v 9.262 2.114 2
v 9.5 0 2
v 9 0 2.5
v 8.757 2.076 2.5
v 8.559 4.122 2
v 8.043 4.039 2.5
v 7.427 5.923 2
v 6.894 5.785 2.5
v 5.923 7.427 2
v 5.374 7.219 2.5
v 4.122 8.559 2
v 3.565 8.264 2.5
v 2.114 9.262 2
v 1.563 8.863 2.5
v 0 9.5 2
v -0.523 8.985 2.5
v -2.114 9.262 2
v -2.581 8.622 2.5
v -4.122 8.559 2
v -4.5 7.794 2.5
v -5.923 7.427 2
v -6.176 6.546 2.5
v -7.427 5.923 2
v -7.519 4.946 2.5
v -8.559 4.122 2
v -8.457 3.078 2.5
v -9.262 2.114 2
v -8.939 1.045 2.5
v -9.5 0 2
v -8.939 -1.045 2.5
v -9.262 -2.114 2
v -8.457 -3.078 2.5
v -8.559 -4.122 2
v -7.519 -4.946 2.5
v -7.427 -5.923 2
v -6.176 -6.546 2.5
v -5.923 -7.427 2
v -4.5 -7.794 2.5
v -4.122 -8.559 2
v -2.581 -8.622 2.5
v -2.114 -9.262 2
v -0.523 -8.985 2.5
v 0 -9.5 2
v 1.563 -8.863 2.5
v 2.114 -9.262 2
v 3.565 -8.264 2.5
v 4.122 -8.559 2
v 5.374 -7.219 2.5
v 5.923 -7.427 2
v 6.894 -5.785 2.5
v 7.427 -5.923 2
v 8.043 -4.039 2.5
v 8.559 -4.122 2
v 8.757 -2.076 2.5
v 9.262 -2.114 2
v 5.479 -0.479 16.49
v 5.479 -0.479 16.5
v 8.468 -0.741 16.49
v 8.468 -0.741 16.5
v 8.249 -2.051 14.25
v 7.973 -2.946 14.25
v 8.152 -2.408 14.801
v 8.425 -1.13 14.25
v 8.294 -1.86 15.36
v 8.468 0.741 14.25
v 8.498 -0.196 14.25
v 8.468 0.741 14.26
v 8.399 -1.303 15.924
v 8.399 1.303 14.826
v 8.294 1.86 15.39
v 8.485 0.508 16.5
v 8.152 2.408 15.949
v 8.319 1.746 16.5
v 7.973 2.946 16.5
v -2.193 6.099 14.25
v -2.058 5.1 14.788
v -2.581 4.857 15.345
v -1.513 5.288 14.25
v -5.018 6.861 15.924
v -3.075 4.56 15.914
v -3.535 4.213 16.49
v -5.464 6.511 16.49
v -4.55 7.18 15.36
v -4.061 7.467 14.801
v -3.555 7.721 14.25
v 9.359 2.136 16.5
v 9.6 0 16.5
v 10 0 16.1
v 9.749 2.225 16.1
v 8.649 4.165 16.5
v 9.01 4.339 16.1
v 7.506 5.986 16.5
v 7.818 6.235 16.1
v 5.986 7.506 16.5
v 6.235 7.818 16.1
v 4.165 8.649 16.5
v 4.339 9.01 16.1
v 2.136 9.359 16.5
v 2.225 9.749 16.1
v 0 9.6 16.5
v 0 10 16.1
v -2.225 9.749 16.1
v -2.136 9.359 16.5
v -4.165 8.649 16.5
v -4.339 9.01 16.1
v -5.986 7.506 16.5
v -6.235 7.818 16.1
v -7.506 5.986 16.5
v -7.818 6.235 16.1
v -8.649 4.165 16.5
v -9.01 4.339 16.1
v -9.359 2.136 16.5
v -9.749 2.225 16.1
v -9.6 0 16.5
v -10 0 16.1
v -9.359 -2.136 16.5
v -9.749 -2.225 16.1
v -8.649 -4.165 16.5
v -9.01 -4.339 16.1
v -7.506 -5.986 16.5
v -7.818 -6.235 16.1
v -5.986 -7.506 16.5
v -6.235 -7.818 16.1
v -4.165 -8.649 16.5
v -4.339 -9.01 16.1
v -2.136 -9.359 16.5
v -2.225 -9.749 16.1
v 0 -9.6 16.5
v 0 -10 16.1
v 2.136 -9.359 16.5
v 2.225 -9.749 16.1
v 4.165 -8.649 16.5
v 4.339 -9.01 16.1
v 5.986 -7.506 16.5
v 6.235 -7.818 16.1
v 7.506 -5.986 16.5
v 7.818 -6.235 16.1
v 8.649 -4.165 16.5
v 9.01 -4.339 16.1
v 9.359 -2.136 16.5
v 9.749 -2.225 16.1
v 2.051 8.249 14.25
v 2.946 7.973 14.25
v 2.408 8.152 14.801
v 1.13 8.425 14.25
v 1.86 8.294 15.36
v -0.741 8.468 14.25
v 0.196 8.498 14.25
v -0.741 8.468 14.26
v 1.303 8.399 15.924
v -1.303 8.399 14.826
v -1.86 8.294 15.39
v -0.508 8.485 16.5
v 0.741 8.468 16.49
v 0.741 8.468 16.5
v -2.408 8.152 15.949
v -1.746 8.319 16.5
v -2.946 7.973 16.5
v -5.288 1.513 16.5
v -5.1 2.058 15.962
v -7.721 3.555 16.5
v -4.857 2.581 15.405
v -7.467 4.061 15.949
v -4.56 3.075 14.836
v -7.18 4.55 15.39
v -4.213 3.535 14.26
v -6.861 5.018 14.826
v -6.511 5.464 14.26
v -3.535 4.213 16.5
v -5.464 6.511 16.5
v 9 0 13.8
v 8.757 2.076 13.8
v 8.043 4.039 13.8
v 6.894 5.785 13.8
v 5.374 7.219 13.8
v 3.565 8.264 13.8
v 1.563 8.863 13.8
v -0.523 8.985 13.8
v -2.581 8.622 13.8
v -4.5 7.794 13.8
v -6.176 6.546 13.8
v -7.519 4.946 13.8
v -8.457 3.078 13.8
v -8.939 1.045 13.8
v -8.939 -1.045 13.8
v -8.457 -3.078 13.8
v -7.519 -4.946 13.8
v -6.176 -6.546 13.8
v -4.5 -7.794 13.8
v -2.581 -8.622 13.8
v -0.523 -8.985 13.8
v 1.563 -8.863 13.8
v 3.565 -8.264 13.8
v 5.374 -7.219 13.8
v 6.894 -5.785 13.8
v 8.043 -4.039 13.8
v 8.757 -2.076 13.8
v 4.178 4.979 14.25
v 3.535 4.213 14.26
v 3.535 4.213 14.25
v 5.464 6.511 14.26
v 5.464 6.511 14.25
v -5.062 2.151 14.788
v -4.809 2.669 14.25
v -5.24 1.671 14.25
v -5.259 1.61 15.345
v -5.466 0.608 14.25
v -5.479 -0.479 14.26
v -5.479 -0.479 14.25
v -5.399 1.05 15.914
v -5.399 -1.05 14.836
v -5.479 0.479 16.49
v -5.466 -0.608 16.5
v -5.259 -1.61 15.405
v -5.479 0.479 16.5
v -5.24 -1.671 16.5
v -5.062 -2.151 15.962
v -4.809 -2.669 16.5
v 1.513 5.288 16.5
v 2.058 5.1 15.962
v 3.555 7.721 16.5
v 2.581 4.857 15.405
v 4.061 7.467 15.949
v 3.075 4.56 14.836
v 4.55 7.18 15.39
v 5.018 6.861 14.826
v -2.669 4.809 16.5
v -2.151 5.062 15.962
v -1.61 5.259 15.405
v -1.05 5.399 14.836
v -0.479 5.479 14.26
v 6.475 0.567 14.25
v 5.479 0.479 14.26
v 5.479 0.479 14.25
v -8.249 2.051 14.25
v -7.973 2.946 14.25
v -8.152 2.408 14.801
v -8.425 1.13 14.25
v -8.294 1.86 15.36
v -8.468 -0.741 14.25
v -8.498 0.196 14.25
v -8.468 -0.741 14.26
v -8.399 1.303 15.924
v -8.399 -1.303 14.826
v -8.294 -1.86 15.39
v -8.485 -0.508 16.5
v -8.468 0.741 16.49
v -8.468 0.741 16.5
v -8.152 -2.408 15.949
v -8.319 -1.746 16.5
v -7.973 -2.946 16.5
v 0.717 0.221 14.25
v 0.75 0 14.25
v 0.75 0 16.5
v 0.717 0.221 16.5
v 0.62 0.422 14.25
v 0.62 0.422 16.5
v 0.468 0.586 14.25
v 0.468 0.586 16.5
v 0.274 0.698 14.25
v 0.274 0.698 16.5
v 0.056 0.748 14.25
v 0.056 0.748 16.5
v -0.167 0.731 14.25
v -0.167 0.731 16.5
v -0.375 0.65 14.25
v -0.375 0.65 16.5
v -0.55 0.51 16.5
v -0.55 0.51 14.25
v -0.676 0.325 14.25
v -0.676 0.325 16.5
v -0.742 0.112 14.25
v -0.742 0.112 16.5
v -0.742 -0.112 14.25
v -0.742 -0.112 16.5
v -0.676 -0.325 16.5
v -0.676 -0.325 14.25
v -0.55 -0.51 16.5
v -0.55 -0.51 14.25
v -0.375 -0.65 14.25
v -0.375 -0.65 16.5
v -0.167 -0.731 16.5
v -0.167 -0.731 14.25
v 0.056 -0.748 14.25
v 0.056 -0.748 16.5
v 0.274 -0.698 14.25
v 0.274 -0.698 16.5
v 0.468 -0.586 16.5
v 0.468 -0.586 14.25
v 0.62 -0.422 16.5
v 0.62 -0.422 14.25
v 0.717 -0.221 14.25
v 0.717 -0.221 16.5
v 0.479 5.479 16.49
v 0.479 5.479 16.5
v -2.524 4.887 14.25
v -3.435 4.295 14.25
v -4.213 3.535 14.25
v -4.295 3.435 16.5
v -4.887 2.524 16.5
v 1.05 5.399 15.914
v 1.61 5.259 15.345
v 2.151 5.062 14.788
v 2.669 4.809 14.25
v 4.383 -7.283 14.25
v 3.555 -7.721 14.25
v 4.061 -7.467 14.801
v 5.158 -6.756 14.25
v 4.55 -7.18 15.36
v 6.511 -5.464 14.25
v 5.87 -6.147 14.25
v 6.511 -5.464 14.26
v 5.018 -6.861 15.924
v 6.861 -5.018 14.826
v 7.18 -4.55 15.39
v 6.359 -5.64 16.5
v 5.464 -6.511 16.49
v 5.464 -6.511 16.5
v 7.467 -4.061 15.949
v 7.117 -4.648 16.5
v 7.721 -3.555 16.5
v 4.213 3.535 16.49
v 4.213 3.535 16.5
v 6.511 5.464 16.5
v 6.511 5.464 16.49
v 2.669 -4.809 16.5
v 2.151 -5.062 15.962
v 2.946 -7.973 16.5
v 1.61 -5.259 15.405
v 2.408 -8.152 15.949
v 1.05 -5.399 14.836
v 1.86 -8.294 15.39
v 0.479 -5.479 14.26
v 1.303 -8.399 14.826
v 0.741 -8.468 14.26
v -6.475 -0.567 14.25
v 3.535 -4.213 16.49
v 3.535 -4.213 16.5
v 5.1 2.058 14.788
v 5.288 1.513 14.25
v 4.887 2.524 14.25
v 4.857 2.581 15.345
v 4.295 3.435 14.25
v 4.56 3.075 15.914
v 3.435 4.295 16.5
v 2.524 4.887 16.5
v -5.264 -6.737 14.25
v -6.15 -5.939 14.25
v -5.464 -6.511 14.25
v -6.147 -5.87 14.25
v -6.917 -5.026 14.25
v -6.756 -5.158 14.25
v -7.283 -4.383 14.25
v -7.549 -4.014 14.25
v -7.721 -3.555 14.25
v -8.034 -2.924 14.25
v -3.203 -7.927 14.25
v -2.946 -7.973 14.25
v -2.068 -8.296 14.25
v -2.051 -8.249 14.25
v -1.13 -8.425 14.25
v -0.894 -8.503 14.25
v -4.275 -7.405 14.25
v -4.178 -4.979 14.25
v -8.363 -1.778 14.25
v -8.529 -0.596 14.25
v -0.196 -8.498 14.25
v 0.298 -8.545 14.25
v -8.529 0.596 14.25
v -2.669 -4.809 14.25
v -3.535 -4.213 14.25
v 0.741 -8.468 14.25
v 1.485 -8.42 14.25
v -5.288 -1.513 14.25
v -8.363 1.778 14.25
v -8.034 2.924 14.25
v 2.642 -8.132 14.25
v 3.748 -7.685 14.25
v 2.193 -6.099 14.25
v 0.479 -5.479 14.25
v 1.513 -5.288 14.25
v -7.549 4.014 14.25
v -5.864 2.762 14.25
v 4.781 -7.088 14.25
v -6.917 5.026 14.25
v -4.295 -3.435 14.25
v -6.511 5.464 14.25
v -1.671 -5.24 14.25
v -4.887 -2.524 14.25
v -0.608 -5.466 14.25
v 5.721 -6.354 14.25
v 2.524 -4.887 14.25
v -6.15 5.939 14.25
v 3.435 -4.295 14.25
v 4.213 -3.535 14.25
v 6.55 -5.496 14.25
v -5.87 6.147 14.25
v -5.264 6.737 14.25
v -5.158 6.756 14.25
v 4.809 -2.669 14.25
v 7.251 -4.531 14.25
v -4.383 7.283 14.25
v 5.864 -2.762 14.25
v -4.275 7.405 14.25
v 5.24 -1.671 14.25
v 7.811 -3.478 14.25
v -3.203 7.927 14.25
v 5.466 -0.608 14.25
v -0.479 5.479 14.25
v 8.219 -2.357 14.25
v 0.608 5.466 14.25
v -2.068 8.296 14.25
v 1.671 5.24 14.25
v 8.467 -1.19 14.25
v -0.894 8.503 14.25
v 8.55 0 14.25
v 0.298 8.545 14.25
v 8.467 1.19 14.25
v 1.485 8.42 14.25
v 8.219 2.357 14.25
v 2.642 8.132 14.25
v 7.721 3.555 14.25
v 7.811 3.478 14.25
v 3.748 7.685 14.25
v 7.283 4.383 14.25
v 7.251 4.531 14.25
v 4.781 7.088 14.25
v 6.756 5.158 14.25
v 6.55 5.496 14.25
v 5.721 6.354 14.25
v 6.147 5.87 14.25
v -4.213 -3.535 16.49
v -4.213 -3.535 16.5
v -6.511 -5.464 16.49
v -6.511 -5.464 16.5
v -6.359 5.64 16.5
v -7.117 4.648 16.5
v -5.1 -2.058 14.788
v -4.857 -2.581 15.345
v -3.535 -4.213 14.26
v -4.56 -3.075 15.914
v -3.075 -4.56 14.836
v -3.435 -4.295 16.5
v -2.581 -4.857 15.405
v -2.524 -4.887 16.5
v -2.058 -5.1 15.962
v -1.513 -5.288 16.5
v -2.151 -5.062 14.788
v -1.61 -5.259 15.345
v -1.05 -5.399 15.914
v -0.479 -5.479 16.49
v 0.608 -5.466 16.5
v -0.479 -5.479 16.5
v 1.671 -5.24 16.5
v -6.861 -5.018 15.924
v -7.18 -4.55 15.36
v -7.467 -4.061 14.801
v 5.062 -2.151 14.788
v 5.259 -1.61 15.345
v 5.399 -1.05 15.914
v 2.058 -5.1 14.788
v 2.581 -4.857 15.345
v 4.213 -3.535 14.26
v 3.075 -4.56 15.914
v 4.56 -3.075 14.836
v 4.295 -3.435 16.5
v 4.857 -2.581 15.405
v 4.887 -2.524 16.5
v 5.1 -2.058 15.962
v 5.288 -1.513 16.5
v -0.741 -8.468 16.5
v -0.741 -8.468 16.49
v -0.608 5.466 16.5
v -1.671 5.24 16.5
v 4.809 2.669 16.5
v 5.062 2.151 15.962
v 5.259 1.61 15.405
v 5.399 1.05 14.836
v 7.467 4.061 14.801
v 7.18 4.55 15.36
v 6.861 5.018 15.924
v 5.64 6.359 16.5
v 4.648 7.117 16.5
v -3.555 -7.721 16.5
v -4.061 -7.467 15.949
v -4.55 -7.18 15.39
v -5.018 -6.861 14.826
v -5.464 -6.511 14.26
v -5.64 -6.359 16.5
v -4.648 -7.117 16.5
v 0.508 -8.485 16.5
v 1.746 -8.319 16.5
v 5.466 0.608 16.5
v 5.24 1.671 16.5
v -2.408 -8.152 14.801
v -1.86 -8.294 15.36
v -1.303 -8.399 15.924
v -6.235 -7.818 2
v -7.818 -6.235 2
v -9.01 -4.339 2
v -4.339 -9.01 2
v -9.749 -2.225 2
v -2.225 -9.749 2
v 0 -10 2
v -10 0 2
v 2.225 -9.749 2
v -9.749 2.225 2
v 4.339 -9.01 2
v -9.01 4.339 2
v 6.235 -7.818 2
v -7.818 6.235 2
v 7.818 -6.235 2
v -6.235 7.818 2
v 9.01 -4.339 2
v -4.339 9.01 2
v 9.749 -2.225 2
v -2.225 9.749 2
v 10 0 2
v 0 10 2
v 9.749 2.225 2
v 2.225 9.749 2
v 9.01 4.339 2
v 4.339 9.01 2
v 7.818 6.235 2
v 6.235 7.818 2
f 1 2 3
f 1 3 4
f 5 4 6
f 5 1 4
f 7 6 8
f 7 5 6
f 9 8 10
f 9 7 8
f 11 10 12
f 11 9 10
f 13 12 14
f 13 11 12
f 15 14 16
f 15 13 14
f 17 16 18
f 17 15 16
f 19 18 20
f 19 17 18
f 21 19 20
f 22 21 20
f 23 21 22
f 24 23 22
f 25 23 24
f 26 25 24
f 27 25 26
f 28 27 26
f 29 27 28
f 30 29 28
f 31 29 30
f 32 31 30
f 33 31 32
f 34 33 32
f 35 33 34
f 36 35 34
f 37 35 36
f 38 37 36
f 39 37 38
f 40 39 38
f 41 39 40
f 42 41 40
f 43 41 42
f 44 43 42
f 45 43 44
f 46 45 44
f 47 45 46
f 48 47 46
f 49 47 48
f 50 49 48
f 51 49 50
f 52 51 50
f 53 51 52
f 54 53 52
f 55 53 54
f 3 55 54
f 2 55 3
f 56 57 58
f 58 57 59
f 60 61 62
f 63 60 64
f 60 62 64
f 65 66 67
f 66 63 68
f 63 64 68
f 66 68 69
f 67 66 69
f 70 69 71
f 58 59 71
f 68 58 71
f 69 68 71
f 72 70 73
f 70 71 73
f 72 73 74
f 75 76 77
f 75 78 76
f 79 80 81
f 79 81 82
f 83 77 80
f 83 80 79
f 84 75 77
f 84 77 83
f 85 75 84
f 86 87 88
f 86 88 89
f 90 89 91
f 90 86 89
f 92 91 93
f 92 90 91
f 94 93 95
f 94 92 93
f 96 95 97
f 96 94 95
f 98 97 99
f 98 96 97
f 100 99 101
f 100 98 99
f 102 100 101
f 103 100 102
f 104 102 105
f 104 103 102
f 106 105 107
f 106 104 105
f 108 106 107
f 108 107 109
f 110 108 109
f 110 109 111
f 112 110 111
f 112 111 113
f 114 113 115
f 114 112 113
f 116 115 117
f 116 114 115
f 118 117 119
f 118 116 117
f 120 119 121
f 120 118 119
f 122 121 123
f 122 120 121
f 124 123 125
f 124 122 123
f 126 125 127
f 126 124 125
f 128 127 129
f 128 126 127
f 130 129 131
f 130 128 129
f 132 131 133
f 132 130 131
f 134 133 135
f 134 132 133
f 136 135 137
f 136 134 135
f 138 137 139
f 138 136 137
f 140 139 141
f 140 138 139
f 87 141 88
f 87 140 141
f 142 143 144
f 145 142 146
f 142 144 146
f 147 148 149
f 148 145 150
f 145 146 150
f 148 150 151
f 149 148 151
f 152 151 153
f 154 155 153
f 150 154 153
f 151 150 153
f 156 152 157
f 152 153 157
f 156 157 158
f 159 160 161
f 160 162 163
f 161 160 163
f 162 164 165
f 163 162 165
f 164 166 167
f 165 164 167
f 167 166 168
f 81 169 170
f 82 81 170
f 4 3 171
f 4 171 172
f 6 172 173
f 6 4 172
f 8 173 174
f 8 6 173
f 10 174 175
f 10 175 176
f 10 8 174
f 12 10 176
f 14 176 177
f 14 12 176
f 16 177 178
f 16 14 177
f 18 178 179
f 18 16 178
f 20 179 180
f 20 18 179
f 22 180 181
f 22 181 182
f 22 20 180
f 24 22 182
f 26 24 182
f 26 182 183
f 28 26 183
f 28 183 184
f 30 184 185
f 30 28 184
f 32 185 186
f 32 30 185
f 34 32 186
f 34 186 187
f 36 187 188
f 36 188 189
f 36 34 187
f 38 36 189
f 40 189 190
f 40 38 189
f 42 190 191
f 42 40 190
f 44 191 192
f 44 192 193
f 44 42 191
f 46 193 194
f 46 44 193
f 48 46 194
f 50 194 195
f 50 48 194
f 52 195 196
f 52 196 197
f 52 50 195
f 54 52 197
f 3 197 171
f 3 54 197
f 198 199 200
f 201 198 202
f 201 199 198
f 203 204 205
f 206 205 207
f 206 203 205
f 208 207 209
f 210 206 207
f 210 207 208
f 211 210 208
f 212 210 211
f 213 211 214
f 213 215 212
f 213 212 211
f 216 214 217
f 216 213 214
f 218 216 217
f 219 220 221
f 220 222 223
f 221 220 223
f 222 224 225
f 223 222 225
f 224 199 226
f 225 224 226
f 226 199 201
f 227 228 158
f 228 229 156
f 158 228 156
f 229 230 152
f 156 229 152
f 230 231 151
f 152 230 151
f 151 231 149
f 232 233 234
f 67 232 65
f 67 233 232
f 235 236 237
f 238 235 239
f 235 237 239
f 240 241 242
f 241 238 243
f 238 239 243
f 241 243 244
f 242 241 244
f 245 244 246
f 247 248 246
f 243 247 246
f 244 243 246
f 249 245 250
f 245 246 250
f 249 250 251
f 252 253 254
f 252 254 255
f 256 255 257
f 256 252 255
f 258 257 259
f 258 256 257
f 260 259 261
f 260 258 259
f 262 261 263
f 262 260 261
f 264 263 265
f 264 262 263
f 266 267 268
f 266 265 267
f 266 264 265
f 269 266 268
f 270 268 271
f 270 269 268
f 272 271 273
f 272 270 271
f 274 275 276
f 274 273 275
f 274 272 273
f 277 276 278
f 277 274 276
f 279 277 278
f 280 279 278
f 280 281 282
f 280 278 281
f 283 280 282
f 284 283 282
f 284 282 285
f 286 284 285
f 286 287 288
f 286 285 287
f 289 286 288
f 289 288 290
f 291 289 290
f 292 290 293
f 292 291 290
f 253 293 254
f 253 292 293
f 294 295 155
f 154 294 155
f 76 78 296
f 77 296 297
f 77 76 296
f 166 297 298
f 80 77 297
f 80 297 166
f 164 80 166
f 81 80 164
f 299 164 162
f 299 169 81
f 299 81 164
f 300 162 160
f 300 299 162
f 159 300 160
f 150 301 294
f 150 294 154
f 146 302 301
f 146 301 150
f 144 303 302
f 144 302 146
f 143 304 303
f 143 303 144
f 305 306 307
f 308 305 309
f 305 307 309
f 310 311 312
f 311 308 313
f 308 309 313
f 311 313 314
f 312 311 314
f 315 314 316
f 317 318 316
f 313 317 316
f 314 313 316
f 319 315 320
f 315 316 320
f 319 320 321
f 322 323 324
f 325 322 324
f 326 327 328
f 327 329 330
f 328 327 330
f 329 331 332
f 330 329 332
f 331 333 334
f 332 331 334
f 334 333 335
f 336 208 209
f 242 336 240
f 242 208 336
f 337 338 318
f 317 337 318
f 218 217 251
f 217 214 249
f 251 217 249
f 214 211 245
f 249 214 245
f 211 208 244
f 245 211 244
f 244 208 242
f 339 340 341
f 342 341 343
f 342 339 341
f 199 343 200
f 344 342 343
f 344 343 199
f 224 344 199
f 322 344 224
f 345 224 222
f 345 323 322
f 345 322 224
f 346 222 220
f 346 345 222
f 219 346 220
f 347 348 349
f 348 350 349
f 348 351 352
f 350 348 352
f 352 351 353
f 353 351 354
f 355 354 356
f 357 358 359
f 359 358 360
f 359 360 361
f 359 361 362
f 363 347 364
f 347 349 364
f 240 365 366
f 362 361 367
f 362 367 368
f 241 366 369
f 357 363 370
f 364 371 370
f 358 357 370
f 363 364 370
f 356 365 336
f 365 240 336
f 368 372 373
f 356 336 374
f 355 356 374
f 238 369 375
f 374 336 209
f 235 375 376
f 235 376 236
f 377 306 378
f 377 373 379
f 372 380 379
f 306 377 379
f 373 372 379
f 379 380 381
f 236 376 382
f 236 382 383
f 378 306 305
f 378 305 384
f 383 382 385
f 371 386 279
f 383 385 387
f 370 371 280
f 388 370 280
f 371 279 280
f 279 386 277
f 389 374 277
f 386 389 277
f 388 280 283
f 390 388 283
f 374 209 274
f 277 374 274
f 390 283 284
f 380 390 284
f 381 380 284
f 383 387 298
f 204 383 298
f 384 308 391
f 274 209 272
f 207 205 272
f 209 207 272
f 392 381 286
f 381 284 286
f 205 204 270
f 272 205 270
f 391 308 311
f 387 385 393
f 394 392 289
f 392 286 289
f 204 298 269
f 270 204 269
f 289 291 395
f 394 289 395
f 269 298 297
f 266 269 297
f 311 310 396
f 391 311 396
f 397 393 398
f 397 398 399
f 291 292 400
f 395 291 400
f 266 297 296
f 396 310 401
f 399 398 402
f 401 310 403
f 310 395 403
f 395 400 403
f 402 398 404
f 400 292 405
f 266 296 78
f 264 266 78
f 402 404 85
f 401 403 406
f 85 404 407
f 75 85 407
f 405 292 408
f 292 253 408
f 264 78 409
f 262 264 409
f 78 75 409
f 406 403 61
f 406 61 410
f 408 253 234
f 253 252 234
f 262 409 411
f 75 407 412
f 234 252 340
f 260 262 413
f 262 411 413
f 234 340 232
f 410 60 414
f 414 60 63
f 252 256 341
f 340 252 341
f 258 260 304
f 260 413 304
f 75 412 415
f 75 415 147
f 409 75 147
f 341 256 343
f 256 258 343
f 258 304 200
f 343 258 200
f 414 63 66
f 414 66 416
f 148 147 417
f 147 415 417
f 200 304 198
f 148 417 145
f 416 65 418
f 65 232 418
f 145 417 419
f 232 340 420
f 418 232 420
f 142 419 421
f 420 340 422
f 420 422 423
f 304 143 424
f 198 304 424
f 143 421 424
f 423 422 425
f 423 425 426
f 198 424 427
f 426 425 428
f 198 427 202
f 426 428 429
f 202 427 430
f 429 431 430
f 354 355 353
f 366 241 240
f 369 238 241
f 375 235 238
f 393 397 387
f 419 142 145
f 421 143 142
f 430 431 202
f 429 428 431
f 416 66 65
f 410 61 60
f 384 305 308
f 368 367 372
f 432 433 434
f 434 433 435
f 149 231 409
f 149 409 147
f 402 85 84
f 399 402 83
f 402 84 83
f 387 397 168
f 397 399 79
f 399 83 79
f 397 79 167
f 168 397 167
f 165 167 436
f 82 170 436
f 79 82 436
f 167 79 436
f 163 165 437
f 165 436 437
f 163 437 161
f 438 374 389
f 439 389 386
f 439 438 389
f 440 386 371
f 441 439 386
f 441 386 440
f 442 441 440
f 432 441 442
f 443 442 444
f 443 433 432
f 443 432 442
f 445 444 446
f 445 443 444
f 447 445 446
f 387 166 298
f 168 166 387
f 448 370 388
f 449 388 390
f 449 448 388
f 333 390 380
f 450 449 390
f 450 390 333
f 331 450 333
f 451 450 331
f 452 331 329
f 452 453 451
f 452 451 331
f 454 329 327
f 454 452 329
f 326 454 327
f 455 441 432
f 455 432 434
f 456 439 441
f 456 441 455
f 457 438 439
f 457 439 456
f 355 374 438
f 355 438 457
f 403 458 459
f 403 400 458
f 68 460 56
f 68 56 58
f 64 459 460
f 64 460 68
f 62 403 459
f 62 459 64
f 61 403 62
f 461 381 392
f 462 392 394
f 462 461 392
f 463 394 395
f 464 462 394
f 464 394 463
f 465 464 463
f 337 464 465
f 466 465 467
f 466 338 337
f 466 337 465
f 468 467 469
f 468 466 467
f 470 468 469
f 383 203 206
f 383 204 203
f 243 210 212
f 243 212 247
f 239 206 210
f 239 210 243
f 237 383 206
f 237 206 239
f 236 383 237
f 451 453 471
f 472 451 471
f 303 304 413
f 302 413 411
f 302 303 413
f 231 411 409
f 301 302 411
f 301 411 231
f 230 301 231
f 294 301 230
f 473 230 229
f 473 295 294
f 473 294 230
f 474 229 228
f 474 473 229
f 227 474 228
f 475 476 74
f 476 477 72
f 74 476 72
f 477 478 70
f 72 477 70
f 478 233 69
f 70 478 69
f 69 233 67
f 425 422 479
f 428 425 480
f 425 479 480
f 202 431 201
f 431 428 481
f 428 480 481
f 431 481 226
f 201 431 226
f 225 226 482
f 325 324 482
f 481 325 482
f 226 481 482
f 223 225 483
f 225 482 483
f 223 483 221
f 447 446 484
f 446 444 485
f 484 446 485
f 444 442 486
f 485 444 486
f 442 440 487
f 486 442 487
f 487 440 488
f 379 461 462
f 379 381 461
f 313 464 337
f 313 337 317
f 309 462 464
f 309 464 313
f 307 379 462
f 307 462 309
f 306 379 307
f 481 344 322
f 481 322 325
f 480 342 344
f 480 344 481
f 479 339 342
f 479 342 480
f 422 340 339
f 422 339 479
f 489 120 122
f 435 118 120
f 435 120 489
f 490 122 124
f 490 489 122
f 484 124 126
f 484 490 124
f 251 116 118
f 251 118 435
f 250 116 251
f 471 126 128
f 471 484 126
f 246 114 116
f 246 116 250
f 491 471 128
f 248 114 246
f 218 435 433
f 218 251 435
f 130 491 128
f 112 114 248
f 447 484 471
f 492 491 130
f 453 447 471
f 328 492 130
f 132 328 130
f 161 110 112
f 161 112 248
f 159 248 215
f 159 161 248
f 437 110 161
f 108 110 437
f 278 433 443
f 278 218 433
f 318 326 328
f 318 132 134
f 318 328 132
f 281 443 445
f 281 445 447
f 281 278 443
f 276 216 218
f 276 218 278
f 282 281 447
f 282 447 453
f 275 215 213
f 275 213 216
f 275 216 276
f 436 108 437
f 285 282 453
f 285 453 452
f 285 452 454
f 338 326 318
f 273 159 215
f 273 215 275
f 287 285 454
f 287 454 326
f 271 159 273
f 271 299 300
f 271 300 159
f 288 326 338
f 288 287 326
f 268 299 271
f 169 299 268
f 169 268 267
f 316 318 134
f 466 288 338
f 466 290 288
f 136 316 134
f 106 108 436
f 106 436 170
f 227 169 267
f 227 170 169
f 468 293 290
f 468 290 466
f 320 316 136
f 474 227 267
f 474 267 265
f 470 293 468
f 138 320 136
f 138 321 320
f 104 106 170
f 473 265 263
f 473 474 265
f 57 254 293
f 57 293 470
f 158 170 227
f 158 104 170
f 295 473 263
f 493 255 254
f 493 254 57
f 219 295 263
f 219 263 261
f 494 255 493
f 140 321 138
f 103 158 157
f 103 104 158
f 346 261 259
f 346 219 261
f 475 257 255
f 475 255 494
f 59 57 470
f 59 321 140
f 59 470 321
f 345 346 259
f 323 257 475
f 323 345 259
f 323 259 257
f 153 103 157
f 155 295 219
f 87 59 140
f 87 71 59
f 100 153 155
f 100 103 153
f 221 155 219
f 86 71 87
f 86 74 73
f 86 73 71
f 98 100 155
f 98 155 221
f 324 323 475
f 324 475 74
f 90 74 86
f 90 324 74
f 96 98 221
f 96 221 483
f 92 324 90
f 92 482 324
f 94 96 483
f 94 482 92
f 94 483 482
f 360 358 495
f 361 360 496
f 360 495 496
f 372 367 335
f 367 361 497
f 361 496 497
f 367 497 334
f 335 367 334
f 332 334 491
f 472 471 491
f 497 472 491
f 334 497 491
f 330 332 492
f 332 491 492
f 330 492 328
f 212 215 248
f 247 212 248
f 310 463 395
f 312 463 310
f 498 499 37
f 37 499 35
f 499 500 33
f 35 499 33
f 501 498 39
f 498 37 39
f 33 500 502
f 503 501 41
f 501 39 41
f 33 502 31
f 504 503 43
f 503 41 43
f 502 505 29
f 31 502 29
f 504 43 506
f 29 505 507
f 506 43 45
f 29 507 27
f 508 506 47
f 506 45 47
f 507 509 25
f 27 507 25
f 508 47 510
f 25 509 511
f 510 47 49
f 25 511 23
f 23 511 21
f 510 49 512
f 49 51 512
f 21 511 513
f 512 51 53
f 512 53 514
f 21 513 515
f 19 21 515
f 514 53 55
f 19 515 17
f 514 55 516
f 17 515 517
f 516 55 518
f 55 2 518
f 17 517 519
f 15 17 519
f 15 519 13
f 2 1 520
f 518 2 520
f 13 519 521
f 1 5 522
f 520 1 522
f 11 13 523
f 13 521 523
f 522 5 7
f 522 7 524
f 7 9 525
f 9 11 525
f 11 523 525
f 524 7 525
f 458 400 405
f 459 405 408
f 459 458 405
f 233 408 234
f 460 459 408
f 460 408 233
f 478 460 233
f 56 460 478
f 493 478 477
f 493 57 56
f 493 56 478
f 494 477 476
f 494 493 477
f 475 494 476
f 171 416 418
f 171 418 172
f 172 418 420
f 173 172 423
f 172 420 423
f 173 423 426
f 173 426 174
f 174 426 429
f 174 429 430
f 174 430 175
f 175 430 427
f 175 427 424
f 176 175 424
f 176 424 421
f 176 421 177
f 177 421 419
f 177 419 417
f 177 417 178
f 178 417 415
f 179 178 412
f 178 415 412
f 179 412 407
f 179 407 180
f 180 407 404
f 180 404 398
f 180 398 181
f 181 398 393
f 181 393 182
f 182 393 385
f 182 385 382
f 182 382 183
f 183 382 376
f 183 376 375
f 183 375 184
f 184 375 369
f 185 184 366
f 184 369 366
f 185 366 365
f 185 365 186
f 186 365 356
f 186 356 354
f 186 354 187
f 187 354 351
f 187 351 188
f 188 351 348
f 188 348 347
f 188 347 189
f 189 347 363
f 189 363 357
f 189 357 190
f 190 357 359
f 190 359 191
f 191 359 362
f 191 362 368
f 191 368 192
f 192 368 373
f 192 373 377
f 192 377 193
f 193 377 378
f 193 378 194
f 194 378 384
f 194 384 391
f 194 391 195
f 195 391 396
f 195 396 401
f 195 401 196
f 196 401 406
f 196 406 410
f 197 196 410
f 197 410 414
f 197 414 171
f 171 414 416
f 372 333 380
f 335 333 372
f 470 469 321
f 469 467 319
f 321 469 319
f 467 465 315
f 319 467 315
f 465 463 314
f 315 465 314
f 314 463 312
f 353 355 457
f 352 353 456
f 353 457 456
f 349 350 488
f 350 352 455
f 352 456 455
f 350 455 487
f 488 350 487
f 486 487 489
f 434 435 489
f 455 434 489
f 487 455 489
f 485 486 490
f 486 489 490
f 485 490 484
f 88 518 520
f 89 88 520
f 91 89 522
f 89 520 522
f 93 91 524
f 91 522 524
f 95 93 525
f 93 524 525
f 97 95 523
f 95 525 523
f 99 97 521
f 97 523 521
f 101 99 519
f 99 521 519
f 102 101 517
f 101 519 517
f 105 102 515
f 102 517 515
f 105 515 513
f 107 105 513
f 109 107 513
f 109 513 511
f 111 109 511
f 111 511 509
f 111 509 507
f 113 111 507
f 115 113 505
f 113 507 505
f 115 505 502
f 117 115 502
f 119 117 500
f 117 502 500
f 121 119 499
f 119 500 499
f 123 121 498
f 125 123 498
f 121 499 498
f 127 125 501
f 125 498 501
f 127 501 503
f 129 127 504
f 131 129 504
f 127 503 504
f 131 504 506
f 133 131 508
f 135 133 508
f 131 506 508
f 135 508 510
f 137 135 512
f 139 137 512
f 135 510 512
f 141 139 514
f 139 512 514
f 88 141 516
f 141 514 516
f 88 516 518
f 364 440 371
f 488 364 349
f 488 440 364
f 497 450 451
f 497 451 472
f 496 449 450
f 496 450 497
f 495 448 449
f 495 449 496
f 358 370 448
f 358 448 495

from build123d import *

# Parameters (mm, degrees)
SKETCH011_R           = 10
PAD007_DEPTH          = 14.5
CHAMFER008_SIZE       = 0.4
SKETCH012_R           = 0.75
POCKET_DEPTH          = 3.501
SKETCH013_R           = 9
POCKET001_DEPTH       = 12.25
POCKET002_DEPTH       = 78.56986
POLARPATTERN002_COUNT = 8
CHAMFER004014008_SIZE = 2.24
CHAMFER004014009_SIZE = 0.5
CHAMFER004014010_SIZE = 0.45


with BuildPart() as part:
    # Sketch011 (on DatumPlane) → Pad007 (new body)
    with BuildSketch(Plane.XY):
        Circle(SKETCH011_R)
    extrude(amount=PAD007_DEPTH)

    # Chamfer008
    chamfer008_edges = [part.edges().sort_by_distance(p)[0] for p in [
        (-10, 0, 14.5),
    ]]
    chamfer(chamfer008_edges, length=CHAMFER008_SIZE)

    # Sketch012 (on DatumPlane) → Pocket (cut, through all)
    with BuildSketch(Plane.XY.offset(11)):
        Circle(SKETCH012_R)
    extrude(amount=POCKET_DEPTH, mode=Mode.SUBTRACT)

    # Sketch013 (on DatumPlane) → Pocket001 (cut)
    with BuildSketch(Plane.XY):
        Circle(SKETCH013_R)
    extrude(amount=POCKET001_DEPTH, mode=Mode.SUBTRACT)

    # Sketch019 (on DatumPlane) → Pocket002 (cut, through all)
    with BuildSketch(Plane.XY.offset(15)):
        with BuildLine():
            ThreePointArc((8.467655, -0.740824), (8.5, 0), (8.467655, 0.740824))
            Line((5.479071, 0.479357), (8.467655, 0.740824))
            ThreePointArc((5.479071, -0.479357), (5.5, 0), (5.479071, 0.479357))
            Line((5.479071, -0.479357), (8.467655, -0.740824))
        make_face()
    pocket002 = extrude(amount=-POCKET002_DEPTH, mode=Mode.SUBTRACT)

    # PolarPattern002: Pocket002 ×8 about axis
    polarpattern002_axis = Axis((0, 0, 15), (0, 0, 1))
    for i in range(1, POLARPATTERN002_COUNT):
        add(pocket002.rotate(polarpattern002_axis, i * 360 / POLARPATTERN002_COUNT), mode=Mode.SUBTRACT)

    # Chamfer004014008
    chamfer004014008_edges = [part.edges().sort_by_distance(p)[0] for p in [
        (-5.362311, -4.499513, 12.25),
        (-6.973363, 0.61009, 12.25),
        (-4.499513, 5.362311, 12.25),
        (0.61009, 6.973363, 12.25),
        (5.362311, 4.499513, 12.25),
        (6.973363, -0.61009, 12.25),
        (4.499513, -5.362311, 12.25),
        (-0.61009, -6.973363, 12.25),
        (-6.973363, -0.61009, 14.5),
        (-5.362311, 4.499513, 14.5),
        (-0.61009, 6.973363, 14.5),
        (4.499513, 5.362311, 14.5),
        (6.973363, 0.61009, 14.5),
        (5.362311, -4.499513, 14.5),
        (0.61009, -6.973363, 14.5),
        (-4.499513, -5.362311, 14.5),
    ]]
    chamfer(chamfer004014008_edges, length=CHAMFER004014008_SIZE)

    # Chamfer004014009
    chamfer004014009_edges = [part.edges().sort_by_distance(p)[0] for p in [
        (-9, 0, 0),
    ]]
    chamfer(chamfer004014009_edges, length=CHAMFER004014009_SIZE)

    # Chamfer004014010
    chamfer004014010_edges = [part.edges().sort_by_distance(p)[0] for p in [
        (-9, 0, 12.25),
    ]]
    chamfer(chamfer004014010_edges, length=CHAMFER004014010_SIZE)


with BuildPart() as part_1:
    # Body002002003003 placement: moved
    add(part.part.moved(Location((0, 0, 2))))


solid = part_1.part
